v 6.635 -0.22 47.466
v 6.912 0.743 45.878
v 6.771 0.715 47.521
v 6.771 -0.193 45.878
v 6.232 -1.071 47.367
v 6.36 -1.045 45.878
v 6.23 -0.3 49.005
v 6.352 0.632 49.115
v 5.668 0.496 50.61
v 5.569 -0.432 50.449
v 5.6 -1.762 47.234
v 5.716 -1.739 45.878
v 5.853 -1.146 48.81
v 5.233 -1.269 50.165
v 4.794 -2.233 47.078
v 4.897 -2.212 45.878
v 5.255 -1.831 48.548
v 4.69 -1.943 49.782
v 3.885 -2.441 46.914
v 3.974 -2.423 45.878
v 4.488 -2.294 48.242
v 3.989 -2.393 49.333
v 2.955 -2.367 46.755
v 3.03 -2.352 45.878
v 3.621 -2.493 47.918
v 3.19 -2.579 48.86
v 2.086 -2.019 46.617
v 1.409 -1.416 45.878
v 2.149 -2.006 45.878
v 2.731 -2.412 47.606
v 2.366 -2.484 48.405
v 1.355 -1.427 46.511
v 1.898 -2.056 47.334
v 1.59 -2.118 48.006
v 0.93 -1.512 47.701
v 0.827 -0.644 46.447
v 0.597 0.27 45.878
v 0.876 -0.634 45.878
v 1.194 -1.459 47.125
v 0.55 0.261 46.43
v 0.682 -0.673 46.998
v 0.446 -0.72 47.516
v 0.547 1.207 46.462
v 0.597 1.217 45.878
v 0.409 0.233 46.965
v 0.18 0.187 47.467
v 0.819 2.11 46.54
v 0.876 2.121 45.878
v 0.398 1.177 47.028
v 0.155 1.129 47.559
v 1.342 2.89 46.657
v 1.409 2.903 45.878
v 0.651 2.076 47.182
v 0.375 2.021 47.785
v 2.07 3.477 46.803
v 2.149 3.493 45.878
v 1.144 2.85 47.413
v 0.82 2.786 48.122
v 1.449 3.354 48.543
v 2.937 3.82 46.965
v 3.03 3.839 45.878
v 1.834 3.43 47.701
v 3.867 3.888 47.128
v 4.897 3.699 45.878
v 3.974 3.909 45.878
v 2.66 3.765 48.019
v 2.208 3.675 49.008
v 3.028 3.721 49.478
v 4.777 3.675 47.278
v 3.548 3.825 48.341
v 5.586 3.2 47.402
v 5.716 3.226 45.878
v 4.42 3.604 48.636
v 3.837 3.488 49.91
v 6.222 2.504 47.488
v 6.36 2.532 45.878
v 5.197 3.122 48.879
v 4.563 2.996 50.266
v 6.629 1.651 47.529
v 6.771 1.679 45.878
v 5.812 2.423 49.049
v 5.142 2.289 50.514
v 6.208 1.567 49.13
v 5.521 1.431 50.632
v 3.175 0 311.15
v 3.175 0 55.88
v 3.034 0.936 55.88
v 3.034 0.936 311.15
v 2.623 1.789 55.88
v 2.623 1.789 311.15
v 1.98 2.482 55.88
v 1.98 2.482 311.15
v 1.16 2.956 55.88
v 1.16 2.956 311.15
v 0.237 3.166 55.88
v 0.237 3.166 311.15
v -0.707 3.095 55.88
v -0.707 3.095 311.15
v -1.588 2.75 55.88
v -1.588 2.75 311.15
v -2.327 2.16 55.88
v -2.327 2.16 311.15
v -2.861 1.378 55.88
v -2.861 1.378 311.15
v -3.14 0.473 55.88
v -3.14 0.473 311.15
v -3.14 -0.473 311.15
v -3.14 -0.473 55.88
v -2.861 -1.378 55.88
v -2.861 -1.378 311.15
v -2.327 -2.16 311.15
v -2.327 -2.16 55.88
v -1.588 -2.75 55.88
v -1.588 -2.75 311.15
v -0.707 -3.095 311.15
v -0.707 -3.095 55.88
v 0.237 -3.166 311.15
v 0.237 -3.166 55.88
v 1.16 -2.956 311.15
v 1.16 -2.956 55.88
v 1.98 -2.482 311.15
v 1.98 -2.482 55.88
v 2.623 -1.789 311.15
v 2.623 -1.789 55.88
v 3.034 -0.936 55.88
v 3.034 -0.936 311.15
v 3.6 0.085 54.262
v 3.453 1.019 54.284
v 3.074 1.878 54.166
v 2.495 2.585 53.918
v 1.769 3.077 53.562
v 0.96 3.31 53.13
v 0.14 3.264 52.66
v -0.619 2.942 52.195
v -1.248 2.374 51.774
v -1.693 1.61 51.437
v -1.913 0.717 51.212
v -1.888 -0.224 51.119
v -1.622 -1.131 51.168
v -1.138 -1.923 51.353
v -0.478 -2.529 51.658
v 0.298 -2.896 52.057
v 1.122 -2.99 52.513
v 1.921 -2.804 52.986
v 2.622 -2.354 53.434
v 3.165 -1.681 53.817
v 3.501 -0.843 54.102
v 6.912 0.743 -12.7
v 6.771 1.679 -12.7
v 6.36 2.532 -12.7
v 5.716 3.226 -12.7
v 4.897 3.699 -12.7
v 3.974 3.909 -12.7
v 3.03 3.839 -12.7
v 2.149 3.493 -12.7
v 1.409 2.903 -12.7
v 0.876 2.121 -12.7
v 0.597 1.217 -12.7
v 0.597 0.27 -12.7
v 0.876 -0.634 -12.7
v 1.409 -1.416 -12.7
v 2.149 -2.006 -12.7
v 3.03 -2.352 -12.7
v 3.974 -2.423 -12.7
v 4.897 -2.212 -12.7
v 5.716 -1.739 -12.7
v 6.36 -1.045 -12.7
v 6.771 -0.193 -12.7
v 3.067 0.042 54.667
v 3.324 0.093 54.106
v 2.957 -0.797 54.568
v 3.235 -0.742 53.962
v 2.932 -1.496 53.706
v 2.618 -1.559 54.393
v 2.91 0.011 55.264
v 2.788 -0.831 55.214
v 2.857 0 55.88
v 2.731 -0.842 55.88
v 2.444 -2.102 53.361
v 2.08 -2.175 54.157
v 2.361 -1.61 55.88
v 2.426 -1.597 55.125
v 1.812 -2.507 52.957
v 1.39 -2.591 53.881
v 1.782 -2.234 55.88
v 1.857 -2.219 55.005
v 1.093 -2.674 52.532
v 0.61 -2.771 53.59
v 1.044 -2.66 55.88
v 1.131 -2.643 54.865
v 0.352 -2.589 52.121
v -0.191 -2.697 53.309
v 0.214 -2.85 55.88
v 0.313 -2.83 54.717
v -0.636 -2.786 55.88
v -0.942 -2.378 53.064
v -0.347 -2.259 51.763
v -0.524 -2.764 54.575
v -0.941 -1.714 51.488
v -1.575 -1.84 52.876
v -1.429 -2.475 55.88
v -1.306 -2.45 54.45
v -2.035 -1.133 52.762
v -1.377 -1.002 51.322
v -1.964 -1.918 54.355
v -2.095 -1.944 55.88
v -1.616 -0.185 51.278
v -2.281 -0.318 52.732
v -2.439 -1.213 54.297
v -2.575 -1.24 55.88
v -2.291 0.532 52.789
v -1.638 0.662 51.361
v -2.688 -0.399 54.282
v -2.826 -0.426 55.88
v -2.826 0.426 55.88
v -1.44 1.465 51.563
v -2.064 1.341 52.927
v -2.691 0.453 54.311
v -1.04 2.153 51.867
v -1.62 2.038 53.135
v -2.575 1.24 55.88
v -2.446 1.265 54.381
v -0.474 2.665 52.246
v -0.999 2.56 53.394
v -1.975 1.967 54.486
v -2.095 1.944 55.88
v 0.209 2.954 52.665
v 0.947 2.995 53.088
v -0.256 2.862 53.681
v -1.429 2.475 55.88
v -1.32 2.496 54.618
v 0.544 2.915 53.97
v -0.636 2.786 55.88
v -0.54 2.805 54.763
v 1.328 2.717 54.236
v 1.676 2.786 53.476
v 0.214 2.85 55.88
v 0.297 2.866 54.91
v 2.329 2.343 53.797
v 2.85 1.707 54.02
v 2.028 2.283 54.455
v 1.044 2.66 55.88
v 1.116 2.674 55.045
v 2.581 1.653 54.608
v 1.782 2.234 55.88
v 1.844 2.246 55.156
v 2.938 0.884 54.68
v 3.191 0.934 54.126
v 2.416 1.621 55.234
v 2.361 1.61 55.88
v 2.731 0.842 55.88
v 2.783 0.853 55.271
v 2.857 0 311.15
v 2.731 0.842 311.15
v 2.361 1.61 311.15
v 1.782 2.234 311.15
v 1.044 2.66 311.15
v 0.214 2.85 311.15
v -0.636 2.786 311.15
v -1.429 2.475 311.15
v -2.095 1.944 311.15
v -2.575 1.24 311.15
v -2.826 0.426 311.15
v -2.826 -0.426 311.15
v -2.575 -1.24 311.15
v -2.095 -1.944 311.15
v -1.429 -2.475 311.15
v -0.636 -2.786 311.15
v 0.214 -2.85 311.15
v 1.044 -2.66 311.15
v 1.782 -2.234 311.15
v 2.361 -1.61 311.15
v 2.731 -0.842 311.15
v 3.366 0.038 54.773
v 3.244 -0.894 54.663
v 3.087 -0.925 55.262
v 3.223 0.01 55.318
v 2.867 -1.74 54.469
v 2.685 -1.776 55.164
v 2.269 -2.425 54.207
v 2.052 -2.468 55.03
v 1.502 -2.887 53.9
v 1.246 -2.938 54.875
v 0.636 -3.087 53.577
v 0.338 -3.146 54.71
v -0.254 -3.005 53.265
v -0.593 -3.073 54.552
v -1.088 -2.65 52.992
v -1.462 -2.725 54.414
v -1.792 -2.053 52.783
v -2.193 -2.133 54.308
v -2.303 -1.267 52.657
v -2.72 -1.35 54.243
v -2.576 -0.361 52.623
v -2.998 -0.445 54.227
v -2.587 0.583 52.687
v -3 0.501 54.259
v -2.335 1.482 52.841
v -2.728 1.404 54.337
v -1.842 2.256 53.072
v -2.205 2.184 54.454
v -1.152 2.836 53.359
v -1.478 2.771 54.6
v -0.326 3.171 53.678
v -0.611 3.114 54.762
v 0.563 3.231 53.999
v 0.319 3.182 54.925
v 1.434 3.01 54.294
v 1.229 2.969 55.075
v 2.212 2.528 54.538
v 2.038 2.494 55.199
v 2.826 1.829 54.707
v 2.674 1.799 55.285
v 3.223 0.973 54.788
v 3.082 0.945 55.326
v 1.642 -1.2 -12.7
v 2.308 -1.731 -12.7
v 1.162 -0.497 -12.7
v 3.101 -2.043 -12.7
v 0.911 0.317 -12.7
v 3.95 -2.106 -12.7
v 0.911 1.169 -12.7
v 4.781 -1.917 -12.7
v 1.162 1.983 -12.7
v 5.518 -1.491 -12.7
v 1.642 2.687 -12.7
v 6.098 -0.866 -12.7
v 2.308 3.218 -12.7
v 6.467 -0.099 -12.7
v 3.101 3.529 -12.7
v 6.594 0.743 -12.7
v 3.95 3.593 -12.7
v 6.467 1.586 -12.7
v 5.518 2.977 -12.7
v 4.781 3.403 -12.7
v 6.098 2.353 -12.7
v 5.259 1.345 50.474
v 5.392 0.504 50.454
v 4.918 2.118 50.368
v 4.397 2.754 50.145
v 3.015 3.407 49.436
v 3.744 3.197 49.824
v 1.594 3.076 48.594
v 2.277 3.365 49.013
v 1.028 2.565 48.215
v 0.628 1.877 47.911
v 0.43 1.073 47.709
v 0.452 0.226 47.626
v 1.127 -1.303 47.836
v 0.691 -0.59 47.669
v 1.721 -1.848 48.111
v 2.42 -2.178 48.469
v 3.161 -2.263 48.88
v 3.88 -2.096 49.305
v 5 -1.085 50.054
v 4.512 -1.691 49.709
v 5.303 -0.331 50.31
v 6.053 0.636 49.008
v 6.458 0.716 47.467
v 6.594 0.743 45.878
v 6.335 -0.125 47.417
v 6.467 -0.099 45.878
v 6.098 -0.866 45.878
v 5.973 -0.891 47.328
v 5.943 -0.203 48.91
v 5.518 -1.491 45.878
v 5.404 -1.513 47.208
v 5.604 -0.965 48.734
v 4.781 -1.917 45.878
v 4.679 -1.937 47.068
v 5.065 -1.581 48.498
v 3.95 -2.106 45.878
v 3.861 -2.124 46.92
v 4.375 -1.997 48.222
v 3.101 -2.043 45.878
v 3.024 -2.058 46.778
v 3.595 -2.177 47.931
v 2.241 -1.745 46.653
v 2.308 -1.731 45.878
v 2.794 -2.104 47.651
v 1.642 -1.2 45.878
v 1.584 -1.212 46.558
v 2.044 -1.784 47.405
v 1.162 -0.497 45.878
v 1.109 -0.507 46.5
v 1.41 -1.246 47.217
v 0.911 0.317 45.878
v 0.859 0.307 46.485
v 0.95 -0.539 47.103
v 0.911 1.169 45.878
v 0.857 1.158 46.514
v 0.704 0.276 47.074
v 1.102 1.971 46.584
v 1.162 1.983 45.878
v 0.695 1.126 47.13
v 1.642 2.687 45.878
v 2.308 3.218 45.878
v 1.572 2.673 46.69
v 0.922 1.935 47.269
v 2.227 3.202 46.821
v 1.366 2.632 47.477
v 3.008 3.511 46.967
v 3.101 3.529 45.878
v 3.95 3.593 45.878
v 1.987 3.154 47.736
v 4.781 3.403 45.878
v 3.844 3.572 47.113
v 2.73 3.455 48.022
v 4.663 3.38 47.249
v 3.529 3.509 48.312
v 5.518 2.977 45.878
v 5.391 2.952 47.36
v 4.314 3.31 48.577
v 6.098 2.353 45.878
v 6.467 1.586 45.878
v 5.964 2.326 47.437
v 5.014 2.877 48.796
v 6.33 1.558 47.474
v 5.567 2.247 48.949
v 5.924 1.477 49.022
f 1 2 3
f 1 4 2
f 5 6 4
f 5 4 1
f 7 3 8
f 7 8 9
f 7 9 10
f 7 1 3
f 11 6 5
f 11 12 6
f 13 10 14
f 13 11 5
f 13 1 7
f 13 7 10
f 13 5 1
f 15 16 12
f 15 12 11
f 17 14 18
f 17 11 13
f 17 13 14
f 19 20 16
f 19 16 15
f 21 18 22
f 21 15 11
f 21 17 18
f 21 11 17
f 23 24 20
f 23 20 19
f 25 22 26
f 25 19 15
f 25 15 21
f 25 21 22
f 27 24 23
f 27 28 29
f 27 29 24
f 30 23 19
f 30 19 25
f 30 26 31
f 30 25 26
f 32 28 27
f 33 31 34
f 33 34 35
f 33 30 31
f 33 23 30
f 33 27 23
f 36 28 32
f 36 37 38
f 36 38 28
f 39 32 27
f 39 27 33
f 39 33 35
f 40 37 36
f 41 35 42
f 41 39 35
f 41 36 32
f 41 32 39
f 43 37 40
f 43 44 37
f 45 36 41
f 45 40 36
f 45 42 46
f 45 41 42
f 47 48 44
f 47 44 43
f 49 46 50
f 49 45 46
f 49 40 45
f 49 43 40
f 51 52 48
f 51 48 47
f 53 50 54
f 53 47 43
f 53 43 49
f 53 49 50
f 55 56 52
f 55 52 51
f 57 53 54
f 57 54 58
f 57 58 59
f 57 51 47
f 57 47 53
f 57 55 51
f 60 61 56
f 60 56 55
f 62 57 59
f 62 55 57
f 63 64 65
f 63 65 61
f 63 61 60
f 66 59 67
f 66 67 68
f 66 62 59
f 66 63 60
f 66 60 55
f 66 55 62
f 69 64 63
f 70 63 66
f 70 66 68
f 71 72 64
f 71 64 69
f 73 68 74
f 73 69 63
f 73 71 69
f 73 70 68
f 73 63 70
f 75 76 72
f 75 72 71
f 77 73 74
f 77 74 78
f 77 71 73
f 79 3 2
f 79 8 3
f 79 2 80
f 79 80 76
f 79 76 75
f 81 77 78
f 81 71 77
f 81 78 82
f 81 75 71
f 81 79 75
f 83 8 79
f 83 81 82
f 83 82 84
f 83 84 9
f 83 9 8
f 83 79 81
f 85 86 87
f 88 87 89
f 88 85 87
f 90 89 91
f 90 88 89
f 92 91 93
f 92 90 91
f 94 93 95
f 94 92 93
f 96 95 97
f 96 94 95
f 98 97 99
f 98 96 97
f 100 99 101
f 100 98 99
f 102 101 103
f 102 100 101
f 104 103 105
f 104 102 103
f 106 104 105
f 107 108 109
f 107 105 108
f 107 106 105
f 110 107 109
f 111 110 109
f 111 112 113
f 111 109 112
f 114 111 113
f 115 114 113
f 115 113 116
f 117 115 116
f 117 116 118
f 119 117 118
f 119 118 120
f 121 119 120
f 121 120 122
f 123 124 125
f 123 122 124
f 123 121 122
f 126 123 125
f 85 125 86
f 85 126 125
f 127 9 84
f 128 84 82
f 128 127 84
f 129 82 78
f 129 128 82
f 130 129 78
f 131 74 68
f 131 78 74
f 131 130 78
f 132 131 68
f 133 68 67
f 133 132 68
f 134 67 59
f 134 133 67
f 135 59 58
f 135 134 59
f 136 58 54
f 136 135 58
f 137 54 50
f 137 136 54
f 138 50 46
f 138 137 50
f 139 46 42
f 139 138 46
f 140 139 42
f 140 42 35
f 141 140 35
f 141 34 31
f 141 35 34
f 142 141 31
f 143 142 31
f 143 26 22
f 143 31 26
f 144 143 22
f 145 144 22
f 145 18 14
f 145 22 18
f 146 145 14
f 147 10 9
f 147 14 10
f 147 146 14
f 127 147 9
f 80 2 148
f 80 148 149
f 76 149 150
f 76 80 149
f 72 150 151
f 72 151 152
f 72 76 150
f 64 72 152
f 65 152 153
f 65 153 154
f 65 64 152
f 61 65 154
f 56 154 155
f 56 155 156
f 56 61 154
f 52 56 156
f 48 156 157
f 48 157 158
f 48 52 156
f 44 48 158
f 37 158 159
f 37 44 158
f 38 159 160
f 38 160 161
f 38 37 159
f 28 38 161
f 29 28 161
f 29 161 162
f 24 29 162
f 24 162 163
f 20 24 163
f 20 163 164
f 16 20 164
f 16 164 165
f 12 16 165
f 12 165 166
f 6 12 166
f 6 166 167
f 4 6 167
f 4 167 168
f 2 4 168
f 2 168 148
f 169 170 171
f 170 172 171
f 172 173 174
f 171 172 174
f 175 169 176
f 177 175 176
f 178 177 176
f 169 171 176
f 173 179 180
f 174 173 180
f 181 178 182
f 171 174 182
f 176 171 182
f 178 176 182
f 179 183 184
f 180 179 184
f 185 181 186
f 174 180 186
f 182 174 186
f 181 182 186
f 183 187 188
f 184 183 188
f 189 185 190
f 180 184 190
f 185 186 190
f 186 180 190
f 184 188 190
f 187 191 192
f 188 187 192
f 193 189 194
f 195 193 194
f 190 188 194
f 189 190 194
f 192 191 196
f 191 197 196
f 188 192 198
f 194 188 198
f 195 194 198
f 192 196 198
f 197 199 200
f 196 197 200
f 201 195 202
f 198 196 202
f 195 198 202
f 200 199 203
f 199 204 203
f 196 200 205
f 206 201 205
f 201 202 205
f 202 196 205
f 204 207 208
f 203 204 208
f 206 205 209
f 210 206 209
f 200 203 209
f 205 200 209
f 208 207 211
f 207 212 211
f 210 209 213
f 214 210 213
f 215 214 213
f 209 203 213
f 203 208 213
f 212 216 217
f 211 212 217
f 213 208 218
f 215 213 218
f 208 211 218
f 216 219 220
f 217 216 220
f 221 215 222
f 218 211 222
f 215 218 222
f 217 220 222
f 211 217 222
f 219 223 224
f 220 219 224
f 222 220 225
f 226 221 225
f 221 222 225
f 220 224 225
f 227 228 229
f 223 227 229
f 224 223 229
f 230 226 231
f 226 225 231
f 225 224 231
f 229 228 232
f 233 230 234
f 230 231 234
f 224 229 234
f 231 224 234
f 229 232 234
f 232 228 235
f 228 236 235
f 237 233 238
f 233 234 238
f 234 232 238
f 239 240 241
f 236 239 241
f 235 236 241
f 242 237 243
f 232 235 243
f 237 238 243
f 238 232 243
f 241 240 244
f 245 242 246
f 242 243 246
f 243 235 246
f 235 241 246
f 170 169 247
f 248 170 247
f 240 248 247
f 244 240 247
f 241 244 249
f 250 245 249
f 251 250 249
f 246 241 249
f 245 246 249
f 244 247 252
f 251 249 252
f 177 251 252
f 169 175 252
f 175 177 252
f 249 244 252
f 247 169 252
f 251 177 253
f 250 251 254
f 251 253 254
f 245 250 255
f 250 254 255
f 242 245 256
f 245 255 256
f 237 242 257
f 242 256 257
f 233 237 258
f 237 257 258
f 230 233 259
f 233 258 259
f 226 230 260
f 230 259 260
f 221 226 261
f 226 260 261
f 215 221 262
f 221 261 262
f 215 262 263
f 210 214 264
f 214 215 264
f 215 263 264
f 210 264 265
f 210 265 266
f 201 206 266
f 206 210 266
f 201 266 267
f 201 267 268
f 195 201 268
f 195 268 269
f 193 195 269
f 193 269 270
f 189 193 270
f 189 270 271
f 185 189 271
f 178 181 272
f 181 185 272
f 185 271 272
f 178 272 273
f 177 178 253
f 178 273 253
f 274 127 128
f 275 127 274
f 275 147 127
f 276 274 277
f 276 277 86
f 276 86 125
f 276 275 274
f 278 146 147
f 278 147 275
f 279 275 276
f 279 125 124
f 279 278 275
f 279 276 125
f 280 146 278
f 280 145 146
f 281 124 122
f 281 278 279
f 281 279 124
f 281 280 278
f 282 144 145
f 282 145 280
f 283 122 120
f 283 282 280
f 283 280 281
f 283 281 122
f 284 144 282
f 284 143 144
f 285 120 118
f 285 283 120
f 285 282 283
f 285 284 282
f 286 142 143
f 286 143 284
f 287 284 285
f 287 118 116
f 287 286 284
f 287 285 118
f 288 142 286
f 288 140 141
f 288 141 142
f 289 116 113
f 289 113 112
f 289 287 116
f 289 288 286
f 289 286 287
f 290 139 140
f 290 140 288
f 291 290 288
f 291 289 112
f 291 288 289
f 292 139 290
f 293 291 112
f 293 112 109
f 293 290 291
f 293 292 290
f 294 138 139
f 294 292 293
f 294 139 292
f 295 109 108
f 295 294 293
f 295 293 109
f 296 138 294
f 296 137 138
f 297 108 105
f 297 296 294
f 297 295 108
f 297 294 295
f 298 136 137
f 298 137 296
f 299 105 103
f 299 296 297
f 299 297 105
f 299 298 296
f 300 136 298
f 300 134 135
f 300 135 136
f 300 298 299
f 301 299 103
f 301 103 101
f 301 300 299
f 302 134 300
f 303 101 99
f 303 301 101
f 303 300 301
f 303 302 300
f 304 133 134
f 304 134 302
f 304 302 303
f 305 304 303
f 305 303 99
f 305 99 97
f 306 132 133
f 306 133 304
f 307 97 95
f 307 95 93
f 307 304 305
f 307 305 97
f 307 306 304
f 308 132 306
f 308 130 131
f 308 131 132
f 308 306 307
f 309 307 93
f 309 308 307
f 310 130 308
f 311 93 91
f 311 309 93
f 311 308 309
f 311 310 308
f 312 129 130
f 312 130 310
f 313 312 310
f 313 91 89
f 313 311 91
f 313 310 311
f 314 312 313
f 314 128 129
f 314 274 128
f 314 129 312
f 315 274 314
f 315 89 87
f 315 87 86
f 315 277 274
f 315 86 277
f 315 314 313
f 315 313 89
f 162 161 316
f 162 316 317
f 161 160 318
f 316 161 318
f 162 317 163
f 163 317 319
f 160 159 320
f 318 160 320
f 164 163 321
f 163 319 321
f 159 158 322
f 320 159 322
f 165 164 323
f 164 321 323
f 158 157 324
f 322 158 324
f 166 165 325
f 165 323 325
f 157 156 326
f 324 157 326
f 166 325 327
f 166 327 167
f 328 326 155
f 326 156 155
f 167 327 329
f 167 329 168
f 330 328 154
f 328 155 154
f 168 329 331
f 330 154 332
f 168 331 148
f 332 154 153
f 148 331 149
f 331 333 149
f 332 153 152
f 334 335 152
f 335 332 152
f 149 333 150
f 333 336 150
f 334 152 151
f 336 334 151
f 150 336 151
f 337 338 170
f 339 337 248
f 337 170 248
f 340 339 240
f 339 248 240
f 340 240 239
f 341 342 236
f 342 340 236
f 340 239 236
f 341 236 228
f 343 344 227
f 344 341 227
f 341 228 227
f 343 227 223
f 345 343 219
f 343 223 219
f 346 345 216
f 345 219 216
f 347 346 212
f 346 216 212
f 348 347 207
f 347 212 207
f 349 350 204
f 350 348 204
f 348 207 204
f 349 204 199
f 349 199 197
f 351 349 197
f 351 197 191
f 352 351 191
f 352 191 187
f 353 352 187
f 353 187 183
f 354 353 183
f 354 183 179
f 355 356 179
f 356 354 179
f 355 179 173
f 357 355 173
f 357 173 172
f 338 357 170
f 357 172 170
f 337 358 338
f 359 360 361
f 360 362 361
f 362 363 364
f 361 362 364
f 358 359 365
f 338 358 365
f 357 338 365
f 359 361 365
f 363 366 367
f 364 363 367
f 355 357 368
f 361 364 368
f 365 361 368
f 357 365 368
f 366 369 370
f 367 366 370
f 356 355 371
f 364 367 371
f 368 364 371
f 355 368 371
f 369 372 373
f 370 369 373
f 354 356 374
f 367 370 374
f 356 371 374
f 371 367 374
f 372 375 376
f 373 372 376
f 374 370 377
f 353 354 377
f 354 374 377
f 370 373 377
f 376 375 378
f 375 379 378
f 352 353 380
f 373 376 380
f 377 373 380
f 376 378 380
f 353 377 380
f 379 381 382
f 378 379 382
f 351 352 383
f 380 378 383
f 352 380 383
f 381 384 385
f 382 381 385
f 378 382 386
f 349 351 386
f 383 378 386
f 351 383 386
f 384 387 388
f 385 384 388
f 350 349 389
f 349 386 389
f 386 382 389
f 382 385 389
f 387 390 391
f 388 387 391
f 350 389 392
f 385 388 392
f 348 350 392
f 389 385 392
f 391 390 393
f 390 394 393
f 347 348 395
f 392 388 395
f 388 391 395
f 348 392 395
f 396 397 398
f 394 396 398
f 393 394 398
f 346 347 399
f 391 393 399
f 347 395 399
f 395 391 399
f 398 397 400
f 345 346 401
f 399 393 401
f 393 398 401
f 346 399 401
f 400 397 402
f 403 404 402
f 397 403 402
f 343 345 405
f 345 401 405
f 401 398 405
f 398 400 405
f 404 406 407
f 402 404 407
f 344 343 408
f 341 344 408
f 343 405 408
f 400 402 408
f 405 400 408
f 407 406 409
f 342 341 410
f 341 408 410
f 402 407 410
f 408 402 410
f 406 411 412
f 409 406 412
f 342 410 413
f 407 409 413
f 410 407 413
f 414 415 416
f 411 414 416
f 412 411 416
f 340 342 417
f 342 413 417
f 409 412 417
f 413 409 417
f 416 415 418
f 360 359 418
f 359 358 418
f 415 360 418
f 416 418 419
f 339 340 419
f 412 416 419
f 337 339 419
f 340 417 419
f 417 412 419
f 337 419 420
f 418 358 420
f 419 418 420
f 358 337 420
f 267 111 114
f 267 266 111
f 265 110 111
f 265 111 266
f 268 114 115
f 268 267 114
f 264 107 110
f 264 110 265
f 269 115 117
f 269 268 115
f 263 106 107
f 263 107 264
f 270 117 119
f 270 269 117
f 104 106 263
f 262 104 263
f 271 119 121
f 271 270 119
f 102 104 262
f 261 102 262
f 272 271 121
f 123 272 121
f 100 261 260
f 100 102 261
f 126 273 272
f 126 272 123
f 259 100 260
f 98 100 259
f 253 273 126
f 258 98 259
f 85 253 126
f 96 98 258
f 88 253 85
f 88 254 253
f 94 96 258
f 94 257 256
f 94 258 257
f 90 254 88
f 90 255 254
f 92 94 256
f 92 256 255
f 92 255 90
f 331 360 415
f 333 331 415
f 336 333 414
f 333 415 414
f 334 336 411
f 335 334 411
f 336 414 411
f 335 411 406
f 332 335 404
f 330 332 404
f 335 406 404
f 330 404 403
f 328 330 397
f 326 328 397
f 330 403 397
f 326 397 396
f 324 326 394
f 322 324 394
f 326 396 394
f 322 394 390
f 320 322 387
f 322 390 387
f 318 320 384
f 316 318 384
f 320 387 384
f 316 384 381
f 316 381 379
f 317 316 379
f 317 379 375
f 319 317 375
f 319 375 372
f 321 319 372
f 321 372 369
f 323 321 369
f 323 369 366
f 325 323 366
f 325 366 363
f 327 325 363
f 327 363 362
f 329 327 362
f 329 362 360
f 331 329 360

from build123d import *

# Parameters (mm, degrees)
SKETCH1_R   = 3.175
SKETCH1_R_2 = 2.8575


with BuildPart() as part:
    # Sweep1: sweep along a path in Sketch2
    with BuildLine(Plane(origin=(0, 0, 0), x_dir=(0, 0, 1), z_dir=(-0.1950903220161292, 0.9807852804032303, 0))) as sweep1_path:
        Line((-12.7, 3.81), (0, 3.81))
        Line((0, 3.81), (2.54, 3.81))
        Line((2.54, 3.81), (45.877931679, 3.81))
        ThreePointArc((45.877931679, 3.81), (47.521432616, 3.593628997), (49.052931679, 2.959261314))
        Line((49.052931679, 2.959261314), (52.705, 0.850738686))
        ThreePointArc((52.705, 0.850738686), (54.236499064, 0.216371003), (55.88, 0))
        Line((55.88, 0), (311.15, 0))
    # Sketch1 → Sweep1 (sweep)
    with BuildSketch(Plane.XY):
        with Locations((3.736791918, 0.743294127)):
            Circle(SKETCH1_R)
        with Locations((3.736791918, 0.743294127)):
            Circle(SKETCH1_R_2, mode=Mode.SUBTRACT)
    sweep(path=sweep1_path.line)


solid = part.part
